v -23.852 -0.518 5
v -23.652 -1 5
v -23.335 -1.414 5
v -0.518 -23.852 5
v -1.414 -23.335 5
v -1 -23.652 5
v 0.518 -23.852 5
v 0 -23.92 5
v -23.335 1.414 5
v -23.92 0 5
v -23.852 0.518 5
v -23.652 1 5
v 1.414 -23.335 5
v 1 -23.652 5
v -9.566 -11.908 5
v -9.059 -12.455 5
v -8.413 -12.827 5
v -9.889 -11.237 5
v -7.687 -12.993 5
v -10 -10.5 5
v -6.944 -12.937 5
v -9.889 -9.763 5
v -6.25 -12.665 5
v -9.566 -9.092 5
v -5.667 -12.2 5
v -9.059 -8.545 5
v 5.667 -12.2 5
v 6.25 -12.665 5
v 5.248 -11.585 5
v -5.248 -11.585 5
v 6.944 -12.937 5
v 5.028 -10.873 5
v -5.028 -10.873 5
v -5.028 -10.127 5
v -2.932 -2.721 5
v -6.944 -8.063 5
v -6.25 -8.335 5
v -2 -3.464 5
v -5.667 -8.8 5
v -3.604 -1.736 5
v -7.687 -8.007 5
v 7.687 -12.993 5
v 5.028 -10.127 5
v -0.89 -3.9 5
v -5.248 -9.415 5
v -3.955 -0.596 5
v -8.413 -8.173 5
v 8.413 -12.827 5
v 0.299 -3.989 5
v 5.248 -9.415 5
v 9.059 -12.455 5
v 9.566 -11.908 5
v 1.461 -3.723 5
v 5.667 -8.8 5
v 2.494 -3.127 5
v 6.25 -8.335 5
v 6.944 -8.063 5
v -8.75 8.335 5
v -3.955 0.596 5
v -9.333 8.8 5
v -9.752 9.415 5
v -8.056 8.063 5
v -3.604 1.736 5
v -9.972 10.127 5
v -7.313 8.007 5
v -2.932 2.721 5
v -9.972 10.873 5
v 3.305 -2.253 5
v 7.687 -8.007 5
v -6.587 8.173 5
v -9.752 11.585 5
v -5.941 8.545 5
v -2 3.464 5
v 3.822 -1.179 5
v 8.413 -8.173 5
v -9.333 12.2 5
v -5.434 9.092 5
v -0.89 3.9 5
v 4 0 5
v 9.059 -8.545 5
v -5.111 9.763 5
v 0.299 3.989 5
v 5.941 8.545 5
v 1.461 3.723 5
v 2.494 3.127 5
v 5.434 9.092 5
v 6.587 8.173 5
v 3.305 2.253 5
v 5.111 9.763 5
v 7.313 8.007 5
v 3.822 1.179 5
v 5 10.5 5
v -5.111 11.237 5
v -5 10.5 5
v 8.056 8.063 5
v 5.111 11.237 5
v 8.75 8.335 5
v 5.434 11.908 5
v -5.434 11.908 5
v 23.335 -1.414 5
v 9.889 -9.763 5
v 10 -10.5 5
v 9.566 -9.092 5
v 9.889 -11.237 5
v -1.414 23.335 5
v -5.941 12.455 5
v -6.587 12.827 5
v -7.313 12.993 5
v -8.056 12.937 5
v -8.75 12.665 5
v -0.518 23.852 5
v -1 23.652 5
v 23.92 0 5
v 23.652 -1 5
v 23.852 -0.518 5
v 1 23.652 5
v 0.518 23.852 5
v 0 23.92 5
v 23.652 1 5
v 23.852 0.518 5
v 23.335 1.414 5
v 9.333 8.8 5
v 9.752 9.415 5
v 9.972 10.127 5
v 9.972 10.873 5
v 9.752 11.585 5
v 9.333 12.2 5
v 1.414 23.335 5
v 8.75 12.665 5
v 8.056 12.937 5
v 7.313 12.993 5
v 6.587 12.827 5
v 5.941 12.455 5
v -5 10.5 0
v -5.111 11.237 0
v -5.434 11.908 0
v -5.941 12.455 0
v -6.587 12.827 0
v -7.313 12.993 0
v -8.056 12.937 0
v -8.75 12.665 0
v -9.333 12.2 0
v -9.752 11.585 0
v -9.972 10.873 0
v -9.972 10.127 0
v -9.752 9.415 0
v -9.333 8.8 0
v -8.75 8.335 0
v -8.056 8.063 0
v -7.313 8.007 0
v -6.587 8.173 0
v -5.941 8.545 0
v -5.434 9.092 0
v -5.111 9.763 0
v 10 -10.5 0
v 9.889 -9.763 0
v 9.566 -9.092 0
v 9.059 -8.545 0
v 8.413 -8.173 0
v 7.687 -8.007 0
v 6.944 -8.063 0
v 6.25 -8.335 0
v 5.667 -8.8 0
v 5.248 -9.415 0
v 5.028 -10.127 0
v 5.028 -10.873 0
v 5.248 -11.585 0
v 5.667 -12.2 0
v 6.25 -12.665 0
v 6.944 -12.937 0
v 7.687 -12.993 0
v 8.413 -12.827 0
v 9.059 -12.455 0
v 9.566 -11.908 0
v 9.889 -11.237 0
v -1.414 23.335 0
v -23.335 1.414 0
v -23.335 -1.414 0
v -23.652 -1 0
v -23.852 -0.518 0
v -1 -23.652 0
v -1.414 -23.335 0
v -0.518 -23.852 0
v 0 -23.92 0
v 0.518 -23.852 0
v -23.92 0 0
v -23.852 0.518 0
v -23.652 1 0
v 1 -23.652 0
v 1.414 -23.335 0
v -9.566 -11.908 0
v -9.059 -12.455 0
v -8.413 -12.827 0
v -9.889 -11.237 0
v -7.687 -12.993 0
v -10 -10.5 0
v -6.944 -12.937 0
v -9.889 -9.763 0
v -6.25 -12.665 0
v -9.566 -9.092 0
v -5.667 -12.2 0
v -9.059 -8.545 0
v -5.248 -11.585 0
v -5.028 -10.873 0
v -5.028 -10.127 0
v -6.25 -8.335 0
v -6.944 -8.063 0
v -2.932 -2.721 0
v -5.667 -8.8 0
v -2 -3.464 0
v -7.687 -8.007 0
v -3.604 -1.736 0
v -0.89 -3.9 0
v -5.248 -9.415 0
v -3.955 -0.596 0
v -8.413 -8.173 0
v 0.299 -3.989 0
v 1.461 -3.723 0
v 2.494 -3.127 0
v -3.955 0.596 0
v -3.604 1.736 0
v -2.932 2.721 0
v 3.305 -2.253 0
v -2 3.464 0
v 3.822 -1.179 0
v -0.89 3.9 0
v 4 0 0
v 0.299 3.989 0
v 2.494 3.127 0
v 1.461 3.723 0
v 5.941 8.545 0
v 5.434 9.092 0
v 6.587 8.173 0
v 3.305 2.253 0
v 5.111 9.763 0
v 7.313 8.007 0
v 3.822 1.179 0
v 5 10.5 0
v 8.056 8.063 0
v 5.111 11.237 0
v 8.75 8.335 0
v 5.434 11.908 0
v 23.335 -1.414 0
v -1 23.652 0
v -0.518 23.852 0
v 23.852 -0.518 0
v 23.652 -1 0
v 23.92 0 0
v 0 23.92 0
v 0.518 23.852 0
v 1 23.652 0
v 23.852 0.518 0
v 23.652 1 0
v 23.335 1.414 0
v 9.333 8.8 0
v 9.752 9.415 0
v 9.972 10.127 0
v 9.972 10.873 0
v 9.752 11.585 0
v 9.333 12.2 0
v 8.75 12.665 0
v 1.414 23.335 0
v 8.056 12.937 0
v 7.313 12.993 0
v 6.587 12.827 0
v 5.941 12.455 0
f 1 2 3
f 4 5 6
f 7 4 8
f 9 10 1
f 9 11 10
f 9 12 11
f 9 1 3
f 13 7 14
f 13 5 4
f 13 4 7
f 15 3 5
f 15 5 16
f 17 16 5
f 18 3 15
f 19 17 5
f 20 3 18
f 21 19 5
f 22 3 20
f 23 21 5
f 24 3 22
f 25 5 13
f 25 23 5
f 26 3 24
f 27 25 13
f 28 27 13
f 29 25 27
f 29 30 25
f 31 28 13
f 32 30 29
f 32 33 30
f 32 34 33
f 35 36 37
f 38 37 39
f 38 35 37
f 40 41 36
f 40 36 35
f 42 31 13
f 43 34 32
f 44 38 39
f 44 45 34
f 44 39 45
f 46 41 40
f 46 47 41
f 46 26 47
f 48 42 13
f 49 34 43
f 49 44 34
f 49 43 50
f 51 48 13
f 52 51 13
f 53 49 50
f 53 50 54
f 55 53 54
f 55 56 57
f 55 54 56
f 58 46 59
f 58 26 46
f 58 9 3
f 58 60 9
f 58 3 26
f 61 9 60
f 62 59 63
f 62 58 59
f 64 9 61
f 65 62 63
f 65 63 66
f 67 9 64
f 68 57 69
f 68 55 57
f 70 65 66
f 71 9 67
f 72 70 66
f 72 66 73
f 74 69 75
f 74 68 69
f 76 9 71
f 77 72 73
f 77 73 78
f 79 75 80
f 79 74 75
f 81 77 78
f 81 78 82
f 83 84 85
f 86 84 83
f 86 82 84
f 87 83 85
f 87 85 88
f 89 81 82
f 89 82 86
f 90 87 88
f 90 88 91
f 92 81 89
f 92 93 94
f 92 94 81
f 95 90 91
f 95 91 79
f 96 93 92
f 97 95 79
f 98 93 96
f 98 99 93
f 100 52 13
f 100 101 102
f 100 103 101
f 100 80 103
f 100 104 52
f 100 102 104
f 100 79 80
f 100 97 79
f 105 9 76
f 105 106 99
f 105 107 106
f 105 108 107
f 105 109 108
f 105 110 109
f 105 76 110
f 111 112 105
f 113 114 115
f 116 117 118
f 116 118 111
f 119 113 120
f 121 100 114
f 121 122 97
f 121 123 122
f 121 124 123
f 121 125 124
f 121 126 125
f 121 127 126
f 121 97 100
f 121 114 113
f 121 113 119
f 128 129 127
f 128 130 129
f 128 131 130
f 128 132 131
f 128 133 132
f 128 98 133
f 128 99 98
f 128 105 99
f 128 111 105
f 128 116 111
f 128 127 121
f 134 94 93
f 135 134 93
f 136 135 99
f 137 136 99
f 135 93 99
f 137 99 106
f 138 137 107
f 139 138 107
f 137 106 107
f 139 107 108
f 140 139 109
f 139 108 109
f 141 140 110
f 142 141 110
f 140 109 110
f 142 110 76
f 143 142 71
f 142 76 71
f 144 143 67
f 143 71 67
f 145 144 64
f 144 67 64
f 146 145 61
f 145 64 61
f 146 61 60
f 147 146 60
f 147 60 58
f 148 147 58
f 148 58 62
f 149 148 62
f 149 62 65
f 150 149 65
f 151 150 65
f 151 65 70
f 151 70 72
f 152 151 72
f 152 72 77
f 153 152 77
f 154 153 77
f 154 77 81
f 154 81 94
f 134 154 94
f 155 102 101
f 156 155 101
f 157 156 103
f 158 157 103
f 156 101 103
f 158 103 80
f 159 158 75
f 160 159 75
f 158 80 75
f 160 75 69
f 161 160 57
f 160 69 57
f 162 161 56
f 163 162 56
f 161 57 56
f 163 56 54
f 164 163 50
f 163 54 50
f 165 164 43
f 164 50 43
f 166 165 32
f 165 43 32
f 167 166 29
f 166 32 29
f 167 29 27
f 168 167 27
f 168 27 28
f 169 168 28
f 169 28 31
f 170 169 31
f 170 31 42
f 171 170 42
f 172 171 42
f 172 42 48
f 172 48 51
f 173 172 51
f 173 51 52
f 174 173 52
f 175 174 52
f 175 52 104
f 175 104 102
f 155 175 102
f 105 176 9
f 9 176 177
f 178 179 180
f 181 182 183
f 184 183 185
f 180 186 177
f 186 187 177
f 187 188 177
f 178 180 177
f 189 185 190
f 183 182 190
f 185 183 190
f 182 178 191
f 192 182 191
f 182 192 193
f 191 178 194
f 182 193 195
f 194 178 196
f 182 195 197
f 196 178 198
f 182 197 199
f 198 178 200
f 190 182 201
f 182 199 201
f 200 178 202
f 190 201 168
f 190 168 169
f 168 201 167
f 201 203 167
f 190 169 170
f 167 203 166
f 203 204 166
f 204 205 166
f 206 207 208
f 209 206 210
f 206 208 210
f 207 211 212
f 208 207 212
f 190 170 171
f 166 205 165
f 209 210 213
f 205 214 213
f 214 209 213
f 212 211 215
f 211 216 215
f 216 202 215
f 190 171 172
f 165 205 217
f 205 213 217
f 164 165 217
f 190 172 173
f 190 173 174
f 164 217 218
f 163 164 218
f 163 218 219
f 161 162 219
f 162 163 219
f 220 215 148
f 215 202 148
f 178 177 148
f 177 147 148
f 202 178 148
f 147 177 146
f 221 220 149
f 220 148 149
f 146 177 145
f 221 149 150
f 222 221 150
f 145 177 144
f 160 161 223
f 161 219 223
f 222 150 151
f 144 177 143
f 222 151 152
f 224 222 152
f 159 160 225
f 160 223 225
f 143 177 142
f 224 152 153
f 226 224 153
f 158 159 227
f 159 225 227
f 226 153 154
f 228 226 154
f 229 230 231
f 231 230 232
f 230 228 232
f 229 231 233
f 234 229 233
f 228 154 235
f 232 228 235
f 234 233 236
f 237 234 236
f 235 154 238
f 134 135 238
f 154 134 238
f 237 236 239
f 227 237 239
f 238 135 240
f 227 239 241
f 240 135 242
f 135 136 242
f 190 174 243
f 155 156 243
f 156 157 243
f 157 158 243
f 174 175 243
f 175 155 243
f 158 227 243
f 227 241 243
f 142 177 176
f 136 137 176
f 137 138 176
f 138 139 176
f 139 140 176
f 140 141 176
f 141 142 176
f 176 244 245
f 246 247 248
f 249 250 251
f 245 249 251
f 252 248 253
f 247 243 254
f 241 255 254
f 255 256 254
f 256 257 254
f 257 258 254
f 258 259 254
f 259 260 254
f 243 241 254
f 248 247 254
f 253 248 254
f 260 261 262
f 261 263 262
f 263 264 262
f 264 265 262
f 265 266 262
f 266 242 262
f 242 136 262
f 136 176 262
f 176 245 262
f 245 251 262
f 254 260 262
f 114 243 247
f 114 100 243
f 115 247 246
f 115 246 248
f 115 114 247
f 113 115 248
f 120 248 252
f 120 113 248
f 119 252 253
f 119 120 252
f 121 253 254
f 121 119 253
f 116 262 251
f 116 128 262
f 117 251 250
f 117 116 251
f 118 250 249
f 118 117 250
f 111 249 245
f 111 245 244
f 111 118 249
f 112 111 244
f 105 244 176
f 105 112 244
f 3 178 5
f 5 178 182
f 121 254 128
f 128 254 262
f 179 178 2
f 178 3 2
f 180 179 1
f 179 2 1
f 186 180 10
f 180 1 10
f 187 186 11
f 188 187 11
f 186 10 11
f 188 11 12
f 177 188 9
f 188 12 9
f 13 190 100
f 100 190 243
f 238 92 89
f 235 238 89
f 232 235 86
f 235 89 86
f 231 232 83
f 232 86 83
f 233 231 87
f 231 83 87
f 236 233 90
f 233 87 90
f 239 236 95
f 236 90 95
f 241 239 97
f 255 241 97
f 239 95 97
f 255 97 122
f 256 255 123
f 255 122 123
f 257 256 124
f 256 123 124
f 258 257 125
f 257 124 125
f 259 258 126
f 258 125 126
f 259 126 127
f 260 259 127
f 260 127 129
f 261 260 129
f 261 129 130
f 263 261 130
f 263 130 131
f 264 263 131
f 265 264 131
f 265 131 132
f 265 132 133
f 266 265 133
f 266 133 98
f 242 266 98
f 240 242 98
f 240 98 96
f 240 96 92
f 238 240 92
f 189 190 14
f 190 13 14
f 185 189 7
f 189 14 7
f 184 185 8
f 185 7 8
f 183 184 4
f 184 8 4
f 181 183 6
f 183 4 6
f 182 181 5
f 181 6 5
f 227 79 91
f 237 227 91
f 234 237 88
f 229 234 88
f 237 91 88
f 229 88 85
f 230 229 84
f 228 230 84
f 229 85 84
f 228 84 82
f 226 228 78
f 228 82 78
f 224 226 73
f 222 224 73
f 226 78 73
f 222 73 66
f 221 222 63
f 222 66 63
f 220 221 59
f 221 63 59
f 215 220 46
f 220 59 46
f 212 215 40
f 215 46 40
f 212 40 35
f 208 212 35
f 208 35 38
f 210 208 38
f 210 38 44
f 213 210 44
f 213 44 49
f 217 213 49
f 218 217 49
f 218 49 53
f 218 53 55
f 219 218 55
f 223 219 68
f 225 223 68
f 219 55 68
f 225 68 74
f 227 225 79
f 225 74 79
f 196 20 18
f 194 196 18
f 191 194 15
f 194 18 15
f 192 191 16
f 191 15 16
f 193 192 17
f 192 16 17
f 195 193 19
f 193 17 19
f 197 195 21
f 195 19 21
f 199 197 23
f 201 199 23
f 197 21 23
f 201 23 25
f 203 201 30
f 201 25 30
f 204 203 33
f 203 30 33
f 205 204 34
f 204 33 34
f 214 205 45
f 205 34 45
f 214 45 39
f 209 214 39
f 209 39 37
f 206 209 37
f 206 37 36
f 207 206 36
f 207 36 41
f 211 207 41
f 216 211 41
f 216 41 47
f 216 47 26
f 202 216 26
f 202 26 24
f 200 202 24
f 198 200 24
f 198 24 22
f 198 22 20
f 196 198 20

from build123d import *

# Parameters (mm, degrees)
EXTRUDE_1_DEPTH     = 5
SKETCH_2_R          = 4
CUT_EXTRUDE_1_DEPTH = 5
SKETCH_5_R          = 2.5
CUT_EXTRUDE_2_DEPTH = 36.355339059
FILLET_1_R          = 2


with BuildPart() as part:
    # 草图1 → 凸台-拉伸1 (new body)
    with BuildSketch(Plane.XY):
        Polygon((0, -24.748737342), (24.748737342, 0), (0, 24.748737342), (-24.748737342, 0), align=None)
    extrude(amount=EXTRUDE_1_DEPTH)

    # 草图2 → 切除-拉伸1 (cut)
    with BuildSketch(Plane.XY.offset(5)):
        Circle(SKETCH_2_R)
    extrude(amount=-CUT_EXTRUDE_1_DEPTH, mode=Mode.SUBTRACT)

    # 草图5 → 切除-拉伸2 (cut, through all)
    with BuildSketch(Plane.XY.offset(5)):
        with Locations((-7.5, 10.5)):
            Circle(SKETCH_5_R)
        with Locations(Location((7.5, 10.5, 0), (0, 0, 180))):
            Circle(SKETCH_5_R)
        with Locations((7.5, -10.5)):
            Circle(SKETCH_5_R)
        with Locations(Location((-7.5, -10.5, 0), (0, 0, 180))):
            Circle(SKETCH_5_R)
    extrude(amount=-CUT_EXTRUDE_2_DEPTH, mode=Mode.SUBTRACT)

    # 圆角1
    fillet_1_edges = [part.edges().sort_by_distance(p)[0] for p in [
        (-24.748737342, 0, 2.5),
        (0, 24.748737342, 2.5),
        (24.748737342, 0, 2.5),
        (0, -24.748737342, 2.5),
    ]]
    fillet(fillet_1_edges, radius=FILLET_1_R)


solid = part.part
